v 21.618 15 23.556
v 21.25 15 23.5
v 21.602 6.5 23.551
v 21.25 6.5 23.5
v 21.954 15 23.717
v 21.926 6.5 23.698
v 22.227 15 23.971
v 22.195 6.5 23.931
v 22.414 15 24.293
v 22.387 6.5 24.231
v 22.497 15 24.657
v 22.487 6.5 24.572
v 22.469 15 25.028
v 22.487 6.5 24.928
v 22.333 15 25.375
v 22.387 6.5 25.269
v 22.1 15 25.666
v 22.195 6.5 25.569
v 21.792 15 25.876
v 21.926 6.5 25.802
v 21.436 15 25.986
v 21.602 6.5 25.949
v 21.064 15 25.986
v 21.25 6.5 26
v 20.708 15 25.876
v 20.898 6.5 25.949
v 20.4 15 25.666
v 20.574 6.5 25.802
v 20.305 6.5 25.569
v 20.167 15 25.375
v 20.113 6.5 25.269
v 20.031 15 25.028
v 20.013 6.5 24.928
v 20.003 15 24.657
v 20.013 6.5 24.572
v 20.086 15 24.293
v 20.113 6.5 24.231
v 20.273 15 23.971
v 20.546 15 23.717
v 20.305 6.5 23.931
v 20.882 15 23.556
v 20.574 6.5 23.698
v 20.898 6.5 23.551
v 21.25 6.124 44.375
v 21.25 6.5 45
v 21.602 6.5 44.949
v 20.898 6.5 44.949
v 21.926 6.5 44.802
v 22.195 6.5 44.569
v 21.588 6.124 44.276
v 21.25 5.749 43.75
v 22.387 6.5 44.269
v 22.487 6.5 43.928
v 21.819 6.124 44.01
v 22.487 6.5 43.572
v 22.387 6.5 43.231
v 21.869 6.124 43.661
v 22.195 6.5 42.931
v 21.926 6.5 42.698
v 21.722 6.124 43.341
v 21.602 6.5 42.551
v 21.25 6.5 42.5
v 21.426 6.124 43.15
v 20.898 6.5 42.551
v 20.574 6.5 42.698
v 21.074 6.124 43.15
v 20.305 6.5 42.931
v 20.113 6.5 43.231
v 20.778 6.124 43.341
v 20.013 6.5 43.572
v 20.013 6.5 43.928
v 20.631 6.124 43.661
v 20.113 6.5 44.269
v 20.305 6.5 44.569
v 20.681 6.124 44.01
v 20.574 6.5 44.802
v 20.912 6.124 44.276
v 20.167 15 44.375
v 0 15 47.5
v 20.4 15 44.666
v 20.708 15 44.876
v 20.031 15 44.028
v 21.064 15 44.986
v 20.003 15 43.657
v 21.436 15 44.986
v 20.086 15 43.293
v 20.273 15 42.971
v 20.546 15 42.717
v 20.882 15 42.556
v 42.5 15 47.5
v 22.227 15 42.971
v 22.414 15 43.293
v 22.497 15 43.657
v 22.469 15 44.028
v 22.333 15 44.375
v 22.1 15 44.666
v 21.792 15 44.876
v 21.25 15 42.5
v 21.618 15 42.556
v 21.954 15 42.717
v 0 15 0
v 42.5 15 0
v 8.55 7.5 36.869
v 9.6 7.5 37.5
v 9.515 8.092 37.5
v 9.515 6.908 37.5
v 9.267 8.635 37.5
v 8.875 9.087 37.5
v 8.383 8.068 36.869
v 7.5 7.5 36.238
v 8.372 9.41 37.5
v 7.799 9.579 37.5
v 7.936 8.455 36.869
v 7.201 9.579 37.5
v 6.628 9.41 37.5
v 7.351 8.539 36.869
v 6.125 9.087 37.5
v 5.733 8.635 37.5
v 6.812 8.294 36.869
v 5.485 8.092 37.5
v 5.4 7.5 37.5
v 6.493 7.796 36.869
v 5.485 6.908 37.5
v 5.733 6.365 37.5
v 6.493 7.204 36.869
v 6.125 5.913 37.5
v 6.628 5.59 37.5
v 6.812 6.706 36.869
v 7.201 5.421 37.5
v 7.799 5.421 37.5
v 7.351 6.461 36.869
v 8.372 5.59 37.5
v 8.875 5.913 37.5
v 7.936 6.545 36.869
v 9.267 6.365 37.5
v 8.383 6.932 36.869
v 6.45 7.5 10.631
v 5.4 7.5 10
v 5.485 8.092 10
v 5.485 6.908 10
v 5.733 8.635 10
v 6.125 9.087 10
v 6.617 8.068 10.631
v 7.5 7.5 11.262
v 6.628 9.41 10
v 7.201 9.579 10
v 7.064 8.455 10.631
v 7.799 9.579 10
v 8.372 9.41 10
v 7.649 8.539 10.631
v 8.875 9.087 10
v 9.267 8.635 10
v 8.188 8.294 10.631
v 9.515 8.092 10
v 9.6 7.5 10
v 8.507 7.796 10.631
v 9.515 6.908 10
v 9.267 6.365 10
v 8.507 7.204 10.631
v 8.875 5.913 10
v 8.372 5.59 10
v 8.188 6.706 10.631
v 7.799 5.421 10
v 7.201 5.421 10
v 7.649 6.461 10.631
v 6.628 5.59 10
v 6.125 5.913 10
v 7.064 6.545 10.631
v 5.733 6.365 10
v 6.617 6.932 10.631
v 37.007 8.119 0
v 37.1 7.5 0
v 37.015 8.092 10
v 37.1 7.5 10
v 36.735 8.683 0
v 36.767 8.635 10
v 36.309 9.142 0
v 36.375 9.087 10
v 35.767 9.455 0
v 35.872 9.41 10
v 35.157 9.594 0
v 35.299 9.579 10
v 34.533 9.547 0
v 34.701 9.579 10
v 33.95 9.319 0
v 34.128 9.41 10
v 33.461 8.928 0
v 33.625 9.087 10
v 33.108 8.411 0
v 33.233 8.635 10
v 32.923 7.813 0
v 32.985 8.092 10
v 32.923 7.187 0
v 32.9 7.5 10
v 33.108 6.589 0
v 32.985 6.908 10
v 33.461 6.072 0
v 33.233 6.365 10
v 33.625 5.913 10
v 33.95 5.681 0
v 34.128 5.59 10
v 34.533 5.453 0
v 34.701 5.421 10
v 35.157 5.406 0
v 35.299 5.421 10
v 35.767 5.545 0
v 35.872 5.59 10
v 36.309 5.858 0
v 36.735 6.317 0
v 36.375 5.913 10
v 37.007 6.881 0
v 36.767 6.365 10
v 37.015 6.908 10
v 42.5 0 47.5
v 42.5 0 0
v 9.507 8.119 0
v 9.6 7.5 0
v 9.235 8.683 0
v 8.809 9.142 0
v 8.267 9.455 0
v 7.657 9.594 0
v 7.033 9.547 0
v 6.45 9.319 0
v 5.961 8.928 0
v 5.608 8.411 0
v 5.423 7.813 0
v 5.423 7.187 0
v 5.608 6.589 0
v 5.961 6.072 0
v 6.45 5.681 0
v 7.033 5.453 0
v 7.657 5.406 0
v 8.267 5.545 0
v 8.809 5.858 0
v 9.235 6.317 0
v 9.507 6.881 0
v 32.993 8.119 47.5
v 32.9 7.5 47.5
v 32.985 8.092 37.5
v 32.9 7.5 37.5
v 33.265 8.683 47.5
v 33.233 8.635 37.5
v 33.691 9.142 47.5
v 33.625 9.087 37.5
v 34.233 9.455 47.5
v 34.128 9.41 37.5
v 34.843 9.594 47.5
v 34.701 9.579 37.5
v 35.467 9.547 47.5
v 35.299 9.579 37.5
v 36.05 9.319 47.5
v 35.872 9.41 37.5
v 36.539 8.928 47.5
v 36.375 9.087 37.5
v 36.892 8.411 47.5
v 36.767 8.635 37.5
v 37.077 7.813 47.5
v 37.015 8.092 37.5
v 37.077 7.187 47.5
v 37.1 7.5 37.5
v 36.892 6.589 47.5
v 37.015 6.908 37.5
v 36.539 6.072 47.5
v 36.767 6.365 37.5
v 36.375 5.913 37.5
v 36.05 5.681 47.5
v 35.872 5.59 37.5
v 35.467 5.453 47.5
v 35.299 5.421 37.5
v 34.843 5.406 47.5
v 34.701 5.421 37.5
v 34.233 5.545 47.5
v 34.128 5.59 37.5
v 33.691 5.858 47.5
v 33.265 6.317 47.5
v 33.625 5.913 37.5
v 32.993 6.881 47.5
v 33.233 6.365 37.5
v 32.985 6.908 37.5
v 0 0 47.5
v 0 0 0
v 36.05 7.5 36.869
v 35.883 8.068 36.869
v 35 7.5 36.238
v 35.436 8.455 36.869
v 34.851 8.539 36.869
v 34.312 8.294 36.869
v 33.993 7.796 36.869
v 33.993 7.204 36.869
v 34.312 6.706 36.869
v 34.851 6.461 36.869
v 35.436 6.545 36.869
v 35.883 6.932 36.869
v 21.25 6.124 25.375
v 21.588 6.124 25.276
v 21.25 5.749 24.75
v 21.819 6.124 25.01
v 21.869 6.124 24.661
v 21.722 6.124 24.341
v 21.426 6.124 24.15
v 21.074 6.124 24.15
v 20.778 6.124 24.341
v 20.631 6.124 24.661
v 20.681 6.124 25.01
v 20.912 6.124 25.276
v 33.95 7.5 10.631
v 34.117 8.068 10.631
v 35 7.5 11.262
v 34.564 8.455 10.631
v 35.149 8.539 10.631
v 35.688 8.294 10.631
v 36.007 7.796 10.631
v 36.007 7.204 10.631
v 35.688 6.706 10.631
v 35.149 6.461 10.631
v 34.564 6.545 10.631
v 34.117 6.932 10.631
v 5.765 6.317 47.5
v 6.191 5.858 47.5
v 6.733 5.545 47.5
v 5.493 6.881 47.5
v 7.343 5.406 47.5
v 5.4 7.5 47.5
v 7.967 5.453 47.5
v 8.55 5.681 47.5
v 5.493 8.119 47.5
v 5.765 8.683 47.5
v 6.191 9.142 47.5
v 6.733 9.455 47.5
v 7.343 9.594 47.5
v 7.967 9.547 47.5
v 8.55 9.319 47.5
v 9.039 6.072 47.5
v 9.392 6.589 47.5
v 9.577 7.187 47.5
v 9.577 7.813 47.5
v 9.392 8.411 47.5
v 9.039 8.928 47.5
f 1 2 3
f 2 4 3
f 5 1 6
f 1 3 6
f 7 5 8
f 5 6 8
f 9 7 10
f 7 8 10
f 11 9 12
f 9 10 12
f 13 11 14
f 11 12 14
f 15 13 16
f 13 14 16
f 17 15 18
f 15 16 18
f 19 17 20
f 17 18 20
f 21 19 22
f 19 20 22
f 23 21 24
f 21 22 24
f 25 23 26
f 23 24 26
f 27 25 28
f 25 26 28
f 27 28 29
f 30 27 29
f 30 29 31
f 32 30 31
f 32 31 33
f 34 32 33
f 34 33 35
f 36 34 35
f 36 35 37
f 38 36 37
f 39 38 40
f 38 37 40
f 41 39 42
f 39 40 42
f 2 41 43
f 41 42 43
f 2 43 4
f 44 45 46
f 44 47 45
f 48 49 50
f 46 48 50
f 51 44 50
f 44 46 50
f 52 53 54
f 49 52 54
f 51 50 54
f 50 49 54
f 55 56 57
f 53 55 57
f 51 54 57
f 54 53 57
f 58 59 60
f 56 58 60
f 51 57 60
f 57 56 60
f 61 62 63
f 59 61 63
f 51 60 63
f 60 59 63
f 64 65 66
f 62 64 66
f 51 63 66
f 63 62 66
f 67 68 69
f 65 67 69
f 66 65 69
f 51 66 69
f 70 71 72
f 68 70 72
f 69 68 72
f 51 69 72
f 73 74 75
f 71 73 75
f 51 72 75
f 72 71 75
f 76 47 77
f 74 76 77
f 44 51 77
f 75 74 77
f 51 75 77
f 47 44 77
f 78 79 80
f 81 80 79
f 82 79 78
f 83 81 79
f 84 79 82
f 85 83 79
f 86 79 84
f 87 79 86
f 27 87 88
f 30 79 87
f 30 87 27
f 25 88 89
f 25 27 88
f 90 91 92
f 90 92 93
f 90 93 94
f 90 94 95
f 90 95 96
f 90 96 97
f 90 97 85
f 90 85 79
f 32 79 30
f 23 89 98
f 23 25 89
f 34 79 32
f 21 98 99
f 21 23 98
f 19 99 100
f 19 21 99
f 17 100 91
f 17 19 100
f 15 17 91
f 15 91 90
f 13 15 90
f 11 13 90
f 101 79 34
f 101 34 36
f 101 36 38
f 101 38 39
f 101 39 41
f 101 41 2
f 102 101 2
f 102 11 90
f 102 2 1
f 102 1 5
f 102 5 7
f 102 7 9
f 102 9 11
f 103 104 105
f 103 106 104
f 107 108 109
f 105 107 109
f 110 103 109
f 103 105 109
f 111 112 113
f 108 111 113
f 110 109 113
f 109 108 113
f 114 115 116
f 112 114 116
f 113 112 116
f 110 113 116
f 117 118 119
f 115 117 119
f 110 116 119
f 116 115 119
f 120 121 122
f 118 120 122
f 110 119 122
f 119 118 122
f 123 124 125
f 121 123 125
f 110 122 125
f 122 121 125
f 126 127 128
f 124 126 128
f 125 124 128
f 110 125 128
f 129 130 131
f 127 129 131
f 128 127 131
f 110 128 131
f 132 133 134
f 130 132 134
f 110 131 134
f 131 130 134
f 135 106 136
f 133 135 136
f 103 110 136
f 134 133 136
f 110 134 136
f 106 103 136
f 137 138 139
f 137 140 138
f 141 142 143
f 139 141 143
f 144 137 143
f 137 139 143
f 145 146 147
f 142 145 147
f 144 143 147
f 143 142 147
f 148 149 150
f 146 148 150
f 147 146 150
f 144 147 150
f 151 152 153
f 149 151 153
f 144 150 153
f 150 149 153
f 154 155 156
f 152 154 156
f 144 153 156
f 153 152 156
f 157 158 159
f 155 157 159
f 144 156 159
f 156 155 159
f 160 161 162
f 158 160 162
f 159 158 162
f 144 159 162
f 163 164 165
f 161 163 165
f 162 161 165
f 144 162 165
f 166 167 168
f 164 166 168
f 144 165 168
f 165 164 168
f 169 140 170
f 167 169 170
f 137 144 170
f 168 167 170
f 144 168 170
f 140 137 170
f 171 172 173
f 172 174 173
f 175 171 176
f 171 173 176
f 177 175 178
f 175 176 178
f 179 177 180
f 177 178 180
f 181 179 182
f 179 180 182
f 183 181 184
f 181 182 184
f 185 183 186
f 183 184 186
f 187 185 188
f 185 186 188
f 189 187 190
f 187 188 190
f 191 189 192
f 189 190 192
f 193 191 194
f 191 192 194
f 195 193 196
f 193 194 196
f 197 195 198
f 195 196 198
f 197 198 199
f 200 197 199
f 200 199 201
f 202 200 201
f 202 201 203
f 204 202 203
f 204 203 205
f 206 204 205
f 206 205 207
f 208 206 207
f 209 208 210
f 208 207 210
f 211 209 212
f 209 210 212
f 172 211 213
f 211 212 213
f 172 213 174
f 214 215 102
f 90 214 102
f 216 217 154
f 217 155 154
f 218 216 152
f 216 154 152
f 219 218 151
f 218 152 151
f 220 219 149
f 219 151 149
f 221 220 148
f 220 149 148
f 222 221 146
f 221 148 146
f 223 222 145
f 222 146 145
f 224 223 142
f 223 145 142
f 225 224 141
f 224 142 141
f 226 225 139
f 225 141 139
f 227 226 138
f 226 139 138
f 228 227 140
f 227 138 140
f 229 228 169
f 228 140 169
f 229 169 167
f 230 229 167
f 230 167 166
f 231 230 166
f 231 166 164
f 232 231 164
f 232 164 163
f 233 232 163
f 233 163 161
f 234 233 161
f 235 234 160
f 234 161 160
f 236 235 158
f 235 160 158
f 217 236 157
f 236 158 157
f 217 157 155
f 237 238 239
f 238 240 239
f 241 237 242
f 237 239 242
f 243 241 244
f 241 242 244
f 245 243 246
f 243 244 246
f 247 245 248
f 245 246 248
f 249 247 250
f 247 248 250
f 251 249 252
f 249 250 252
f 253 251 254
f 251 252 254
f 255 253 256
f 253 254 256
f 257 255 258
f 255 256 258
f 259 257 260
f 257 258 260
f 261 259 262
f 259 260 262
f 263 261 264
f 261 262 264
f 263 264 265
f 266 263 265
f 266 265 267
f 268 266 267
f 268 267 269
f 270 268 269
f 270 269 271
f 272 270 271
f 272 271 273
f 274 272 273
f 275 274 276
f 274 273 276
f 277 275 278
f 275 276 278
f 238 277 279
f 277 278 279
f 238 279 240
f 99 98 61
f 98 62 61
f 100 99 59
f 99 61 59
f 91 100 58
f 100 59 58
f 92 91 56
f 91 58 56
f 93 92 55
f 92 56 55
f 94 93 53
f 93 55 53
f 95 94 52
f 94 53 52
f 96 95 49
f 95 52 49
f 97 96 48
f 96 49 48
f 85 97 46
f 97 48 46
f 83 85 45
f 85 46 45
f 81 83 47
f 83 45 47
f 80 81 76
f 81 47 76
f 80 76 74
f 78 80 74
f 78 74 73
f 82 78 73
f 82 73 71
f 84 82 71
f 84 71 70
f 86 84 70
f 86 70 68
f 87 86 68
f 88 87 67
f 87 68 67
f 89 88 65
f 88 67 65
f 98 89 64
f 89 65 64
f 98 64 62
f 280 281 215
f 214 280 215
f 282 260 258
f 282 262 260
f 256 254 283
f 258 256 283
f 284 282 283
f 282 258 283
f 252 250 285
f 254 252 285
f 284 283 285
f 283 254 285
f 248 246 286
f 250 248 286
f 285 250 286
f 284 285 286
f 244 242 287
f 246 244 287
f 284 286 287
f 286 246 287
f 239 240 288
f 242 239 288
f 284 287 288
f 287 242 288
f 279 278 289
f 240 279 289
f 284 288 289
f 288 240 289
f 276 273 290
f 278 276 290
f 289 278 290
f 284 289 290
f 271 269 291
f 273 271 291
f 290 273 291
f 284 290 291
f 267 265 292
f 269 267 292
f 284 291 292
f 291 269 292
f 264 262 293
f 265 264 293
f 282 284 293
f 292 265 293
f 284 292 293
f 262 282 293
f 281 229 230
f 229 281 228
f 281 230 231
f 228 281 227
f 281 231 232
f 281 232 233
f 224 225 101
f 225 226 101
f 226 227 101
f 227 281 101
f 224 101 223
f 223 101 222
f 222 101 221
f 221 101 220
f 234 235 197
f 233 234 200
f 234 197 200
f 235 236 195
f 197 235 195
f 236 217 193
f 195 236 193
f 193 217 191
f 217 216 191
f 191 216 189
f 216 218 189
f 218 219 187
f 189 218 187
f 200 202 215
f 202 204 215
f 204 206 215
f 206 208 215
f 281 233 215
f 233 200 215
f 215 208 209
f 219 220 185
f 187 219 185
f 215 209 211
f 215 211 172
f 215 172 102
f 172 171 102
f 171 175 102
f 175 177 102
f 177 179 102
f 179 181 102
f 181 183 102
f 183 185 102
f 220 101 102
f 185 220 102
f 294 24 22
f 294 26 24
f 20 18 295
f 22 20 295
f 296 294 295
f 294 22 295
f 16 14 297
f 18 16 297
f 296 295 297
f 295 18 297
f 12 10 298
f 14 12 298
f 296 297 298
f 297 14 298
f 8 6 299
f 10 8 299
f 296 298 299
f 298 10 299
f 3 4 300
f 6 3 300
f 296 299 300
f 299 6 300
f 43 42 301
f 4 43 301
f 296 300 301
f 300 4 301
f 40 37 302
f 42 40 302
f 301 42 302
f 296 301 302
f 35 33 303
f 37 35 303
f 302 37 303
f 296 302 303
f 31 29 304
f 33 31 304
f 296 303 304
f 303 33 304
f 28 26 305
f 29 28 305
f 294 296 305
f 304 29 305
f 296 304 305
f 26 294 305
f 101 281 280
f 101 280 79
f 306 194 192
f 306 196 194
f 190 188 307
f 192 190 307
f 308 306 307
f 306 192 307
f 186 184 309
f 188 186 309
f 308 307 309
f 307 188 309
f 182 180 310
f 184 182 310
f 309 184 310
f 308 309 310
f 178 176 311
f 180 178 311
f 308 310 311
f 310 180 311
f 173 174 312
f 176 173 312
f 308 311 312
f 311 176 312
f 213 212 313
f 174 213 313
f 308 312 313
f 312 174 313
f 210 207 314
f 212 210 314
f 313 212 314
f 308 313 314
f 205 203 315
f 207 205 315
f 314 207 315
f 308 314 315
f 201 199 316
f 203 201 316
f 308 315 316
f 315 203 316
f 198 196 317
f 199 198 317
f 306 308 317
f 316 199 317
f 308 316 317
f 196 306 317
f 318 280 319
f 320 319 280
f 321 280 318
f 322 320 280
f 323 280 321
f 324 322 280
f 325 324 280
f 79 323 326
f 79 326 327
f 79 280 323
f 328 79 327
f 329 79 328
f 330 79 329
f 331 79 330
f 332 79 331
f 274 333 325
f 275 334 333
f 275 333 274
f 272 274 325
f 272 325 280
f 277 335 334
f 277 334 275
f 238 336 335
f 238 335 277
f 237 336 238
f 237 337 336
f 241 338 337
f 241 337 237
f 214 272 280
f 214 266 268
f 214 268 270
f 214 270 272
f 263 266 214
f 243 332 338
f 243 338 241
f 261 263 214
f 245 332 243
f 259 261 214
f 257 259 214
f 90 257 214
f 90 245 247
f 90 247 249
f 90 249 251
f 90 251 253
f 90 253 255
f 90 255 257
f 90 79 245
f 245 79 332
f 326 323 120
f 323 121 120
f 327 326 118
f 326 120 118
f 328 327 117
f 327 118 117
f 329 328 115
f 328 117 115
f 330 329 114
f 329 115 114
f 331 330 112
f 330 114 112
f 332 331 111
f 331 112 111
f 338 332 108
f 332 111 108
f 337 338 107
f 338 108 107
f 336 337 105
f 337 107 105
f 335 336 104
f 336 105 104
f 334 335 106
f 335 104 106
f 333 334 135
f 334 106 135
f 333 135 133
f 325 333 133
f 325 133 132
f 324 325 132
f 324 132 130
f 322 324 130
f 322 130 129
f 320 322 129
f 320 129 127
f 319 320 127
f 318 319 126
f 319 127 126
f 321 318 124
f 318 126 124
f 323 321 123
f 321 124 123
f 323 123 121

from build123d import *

# Parameters (mm, degrees)
SKIZZE1_W                       = 42.5
SKIZZE1_H                       = 15
AUFSATZ_LINEAR_AUSTRAGEN1_DEPTH = 47.5
M5_GEWINDEBOHRUNG1_D            = 4.2
M5_GEWINDEBOHRUNG1_DEPTH        = 10
M5_GEWINDEBOHRUNG1_TIP          = 1.2618073
M5_GEWINDEBOHRUNG2_D            = 4.2
M5_GEWINDEBOHRUNG2_DEPTH        = 10
M5_GEWINDEBOHRUNG2_TIP          = 1.2618073
M3_GEWINDEBOHRUNG1_D            = 2.5
M3_GEWINDEBOHRUNG1_DEPTH        = 8.5
M3_GEWINDEBOHRUNG1_TIP          = 0.751075774


with BuildPart() as part:
    # Skizze1 → Aufsatz-Linear austragen1 (new body)
    with BuildSketch(Plane.XY):
        with Locations((21.25, 7.5)):
            Rectangle(SKIZZE1_W, SKIZZE1_H)
    extrude(amount=AUFSATZ_LINEAR_AUSTRAGEN1_DEPTH)

    # M5 Gewindebohrung1
    with Locations(Plane(origin=(0, 0, 0), x_dir=(-1, 0, 0), z_dir=(0, 0, -1))):
        with Locations((-7.5, 7.5), (-35, 7.5)):
            Hole(M5_GEWINDEBOHRUNG1_D / 2, depth=M5_GEWINDEBOHRUNG1_DEPTH)
            with Locations((0, 0, -(M5_GEWINDEBOHRUNG1_DEPTH + M5_GEWINDEBOHRUNG1_TIP / 2))):  # 118° drill point
                Cone(0, M5_GEWINDEBOHRUNG1_D / 2, M5_GEWINDEBOHRUNG1_TIP, mode=Mode.SUBTRACT)

    # M5 Gewindebohrung2
    with Locations(Plane(origin=(7.5, 7.5, 47.5), x_dir=(1, 0, 0), z_dir=(0, 0, 1))):
        with Locations((0, 0), (27.5, 0)):
            Hole(M5_GEWINDEBOHRUNG2_D / 2, depth=M5_GEWINDEBOHRUNG2_DEPTH)
            with Locations((0, 0, -(M5_GEWINDEBOHRUNG2_DEPTH + M5_GEWINDEBOHRUNG2_TIP / 2))):  # 118° drill point
                Cone(0, M5_GEWINDEBOHRUNG2_D / 2, M5_GEWINDEBOHRUNG2_TIP, mode=Mode.SUBTRACT)

    # M3 Gewindebohrung1
    with Locations(Plane(origin=(21.25, 15, 43.75), x_dir=(0, 0, 1), z_dir=(0, 1, 0))):
        with Locations((0, 0), (-19, 0)):
            Hole(M3_GEWINDEBOHRUNG1_D / 2, depth=M3_GEWINDEBOHRUNG1_DEPTH)
            with Locations((0, 0, -(M3_GEWINDEBOHRUNG1_DEPTH + M3_GEWINDEBOHRUNG1_TIP / 2))):  # 118° drill point
                Cone(0, M3_GEWINDEBOHRUNG1_D / 2, M3_GEWINDEBOHRUNG1_TIP, mode=Mode.SUBTRACT)


solid = part.part
